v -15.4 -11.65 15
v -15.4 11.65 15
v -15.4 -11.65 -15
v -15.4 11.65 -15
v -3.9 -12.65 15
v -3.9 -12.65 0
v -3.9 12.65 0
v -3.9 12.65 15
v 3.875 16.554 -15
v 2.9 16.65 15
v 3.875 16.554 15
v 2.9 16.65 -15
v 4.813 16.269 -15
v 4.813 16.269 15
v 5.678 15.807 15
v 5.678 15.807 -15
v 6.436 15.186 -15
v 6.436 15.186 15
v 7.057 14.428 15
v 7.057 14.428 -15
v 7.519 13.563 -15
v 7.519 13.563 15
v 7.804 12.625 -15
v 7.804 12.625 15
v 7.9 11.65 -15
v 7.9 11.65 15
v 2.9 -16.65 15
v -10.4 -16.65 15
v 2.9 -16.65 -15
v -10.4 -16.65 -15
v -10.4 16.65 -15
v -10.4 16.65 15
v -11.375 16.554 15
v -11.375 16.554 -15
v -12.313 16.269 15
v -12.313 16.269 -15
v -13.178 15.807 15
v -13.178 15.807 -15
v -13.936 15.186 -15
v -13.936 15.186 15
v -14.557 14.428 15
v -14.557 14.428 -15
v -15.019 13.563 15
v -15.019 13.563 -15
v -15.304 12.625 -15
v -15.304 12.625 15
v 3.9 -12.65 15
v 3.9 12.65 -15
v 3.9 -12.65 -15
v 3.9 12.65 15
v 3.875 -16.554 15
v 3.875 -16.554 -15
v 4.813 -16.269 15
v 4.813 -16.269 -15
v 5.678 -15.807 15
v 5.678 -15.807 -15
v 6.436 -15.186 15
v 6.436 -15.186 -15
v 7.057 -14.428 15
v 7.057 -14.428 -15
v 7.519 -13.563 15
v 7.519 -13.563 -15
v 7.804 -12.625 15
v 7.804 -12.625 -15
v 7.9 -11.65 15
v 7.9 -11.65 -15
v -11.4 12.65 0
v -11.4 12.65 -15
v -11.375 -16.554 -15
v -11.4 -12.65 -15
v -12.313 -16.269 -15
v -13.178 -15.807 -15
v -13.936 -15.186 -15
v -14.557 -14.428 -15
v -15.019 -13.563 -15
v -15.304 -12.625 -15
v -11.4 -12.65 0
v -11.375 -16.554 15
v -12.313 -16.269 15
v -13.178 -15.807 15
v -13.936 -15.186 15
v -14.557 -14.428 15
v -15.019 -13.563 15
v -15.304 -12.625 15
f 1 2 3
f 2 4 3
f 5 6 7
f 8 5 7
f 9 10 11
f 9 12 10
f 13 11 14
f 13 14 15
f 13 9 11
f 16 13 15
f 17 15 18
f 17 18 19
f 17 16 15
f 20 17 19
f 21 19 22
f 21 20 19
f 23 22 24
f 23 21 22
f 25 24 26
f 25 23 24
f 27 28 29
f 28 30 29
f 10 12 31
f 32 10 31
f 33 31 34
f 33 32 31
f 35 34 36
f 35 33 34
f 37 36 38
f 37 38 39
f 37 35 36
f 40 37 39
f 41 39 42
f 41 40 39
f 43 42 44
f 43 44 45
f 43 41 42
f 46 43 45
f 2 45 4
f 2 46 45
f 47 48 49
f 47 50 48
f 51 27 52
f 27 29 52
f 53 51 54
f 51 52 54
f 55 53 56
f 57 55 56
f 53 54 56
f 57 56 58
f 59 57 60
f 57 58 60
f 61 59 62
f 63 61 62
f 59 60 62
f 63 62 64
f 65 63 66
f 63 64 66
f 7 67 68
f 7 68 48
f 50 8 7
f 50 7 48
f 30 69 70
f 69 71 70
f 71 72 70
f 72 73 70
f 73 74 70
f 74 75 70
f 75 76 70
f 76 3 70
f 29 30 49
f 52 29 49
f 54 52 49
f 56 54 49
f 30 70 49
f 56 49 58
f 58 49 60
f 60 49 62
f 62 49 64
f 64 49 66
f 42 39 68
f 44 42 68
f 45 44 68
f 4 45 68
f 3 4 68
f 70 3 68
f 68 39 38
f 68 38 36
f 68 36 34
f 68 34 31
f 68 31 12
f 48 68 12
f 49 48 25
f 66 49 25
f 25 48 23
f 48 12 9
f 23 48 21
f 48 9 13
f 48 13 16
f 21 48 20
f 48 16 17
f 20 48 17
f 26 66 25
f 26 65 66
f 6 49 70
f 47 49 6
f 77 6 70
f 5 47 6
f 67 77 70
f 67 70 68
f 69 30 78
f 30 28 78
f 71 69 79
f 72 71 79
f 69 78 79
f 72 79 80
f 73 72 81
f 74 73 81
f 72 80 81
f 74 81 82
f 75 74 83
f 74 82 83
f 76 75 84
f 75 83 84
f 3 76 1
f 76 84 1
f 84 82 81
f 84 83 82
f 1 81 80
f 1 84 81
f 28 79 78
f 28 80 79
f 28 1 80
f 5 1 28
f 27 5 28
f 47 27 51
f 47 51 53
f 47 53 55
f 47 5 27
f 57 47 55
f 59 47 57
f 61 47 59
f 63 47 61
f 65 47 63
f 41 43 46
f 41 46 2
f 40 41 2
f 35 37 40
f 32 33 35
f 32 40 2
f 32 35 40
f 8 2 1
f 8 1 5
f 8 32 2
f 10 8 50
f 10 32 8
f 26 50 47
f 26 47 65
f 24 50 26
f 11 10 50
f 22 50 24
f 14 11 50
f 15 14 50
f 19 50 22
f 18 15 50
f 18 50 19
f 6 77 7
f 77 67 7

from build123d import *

# Parameters (mm, degrees)
F0_W     = 15.8
F0_H     = 33.3
F0_W_2   = 7.8
F0_H_2   = 25.3
F1_DEPTH = 15
F3_DEPTH = 15
F4_DEPTH = 15
F2_W     = 3.5
F2_H     = 25.3
F5_DEPTH = 15
F6_R     = 5


with BuildPart() as f1:
    # F0 (on Top) → F1 (new body)
    with BuildSketch(Plane.XY):
        Rectangle(F0_W, F0_H)
        Rectangle(F0_W_2, F0_H_2, mode=Mode.SUBTRACT)
    extrude(amount=F1_DEPTH)

    # F2 (on Top) → F3 (join)
    with BuildSketch(Plane.XY):
        Polygon((3.9, 12.65), (3.9, -12.65), (-7.9, -12.65), (-7.9, -16.65), (5.9, -16.65), (5.9, 16.65), (-7.9, 16.65), (-7.9, 12.65), align=None)
        Polygon((-7.9, -16.65), (-7.9, -12.65), (-11.4, -12.65), (-11.4, 12.65), (-7.9, 12.65), (-7.9, 16.65), (-15.4, 16.65), (-15.4, -16.65), align=None)
    extrude(amount=-F3_DEPTH)

    # F4 (add, through all): a face of the model
    f4_faces = [f1.faces().sort_by_distance(p)[0] for p in [
        (6.9, 0, 0),
    ]]
    extrude(f4_faces, amount=F4_DEPTH)

    # F2 (on Top) → F5 (join, through all)
    with BuildSketch(Plane.XY):
        Polygon((-7.9, -16.65), (-7.9, -12.65), (-11.4, -12.65), (-11.4, 12.65), (-7.9, 12.65), (-7.9, 16.65), (-15.4, 16.65), (-15.4, -16.65), align=None)
        with Locations((-9.65, 0)):
            Rectangle(F2_W, F2_H)
    extrude(amount=F5_DEPTH)

    # F6
    f6_edges = [f1.edges().sort_by_distance(p)[0] for p in [
        (-15.4, -16.65, 0),
        (-15.4, 16.65, 0),
        (7.9, 16.65, 0),
        (7.9, -16.65, 0),
    ]]
    fillet(f6_edges, radius=F6_R)


solid = f1.part
